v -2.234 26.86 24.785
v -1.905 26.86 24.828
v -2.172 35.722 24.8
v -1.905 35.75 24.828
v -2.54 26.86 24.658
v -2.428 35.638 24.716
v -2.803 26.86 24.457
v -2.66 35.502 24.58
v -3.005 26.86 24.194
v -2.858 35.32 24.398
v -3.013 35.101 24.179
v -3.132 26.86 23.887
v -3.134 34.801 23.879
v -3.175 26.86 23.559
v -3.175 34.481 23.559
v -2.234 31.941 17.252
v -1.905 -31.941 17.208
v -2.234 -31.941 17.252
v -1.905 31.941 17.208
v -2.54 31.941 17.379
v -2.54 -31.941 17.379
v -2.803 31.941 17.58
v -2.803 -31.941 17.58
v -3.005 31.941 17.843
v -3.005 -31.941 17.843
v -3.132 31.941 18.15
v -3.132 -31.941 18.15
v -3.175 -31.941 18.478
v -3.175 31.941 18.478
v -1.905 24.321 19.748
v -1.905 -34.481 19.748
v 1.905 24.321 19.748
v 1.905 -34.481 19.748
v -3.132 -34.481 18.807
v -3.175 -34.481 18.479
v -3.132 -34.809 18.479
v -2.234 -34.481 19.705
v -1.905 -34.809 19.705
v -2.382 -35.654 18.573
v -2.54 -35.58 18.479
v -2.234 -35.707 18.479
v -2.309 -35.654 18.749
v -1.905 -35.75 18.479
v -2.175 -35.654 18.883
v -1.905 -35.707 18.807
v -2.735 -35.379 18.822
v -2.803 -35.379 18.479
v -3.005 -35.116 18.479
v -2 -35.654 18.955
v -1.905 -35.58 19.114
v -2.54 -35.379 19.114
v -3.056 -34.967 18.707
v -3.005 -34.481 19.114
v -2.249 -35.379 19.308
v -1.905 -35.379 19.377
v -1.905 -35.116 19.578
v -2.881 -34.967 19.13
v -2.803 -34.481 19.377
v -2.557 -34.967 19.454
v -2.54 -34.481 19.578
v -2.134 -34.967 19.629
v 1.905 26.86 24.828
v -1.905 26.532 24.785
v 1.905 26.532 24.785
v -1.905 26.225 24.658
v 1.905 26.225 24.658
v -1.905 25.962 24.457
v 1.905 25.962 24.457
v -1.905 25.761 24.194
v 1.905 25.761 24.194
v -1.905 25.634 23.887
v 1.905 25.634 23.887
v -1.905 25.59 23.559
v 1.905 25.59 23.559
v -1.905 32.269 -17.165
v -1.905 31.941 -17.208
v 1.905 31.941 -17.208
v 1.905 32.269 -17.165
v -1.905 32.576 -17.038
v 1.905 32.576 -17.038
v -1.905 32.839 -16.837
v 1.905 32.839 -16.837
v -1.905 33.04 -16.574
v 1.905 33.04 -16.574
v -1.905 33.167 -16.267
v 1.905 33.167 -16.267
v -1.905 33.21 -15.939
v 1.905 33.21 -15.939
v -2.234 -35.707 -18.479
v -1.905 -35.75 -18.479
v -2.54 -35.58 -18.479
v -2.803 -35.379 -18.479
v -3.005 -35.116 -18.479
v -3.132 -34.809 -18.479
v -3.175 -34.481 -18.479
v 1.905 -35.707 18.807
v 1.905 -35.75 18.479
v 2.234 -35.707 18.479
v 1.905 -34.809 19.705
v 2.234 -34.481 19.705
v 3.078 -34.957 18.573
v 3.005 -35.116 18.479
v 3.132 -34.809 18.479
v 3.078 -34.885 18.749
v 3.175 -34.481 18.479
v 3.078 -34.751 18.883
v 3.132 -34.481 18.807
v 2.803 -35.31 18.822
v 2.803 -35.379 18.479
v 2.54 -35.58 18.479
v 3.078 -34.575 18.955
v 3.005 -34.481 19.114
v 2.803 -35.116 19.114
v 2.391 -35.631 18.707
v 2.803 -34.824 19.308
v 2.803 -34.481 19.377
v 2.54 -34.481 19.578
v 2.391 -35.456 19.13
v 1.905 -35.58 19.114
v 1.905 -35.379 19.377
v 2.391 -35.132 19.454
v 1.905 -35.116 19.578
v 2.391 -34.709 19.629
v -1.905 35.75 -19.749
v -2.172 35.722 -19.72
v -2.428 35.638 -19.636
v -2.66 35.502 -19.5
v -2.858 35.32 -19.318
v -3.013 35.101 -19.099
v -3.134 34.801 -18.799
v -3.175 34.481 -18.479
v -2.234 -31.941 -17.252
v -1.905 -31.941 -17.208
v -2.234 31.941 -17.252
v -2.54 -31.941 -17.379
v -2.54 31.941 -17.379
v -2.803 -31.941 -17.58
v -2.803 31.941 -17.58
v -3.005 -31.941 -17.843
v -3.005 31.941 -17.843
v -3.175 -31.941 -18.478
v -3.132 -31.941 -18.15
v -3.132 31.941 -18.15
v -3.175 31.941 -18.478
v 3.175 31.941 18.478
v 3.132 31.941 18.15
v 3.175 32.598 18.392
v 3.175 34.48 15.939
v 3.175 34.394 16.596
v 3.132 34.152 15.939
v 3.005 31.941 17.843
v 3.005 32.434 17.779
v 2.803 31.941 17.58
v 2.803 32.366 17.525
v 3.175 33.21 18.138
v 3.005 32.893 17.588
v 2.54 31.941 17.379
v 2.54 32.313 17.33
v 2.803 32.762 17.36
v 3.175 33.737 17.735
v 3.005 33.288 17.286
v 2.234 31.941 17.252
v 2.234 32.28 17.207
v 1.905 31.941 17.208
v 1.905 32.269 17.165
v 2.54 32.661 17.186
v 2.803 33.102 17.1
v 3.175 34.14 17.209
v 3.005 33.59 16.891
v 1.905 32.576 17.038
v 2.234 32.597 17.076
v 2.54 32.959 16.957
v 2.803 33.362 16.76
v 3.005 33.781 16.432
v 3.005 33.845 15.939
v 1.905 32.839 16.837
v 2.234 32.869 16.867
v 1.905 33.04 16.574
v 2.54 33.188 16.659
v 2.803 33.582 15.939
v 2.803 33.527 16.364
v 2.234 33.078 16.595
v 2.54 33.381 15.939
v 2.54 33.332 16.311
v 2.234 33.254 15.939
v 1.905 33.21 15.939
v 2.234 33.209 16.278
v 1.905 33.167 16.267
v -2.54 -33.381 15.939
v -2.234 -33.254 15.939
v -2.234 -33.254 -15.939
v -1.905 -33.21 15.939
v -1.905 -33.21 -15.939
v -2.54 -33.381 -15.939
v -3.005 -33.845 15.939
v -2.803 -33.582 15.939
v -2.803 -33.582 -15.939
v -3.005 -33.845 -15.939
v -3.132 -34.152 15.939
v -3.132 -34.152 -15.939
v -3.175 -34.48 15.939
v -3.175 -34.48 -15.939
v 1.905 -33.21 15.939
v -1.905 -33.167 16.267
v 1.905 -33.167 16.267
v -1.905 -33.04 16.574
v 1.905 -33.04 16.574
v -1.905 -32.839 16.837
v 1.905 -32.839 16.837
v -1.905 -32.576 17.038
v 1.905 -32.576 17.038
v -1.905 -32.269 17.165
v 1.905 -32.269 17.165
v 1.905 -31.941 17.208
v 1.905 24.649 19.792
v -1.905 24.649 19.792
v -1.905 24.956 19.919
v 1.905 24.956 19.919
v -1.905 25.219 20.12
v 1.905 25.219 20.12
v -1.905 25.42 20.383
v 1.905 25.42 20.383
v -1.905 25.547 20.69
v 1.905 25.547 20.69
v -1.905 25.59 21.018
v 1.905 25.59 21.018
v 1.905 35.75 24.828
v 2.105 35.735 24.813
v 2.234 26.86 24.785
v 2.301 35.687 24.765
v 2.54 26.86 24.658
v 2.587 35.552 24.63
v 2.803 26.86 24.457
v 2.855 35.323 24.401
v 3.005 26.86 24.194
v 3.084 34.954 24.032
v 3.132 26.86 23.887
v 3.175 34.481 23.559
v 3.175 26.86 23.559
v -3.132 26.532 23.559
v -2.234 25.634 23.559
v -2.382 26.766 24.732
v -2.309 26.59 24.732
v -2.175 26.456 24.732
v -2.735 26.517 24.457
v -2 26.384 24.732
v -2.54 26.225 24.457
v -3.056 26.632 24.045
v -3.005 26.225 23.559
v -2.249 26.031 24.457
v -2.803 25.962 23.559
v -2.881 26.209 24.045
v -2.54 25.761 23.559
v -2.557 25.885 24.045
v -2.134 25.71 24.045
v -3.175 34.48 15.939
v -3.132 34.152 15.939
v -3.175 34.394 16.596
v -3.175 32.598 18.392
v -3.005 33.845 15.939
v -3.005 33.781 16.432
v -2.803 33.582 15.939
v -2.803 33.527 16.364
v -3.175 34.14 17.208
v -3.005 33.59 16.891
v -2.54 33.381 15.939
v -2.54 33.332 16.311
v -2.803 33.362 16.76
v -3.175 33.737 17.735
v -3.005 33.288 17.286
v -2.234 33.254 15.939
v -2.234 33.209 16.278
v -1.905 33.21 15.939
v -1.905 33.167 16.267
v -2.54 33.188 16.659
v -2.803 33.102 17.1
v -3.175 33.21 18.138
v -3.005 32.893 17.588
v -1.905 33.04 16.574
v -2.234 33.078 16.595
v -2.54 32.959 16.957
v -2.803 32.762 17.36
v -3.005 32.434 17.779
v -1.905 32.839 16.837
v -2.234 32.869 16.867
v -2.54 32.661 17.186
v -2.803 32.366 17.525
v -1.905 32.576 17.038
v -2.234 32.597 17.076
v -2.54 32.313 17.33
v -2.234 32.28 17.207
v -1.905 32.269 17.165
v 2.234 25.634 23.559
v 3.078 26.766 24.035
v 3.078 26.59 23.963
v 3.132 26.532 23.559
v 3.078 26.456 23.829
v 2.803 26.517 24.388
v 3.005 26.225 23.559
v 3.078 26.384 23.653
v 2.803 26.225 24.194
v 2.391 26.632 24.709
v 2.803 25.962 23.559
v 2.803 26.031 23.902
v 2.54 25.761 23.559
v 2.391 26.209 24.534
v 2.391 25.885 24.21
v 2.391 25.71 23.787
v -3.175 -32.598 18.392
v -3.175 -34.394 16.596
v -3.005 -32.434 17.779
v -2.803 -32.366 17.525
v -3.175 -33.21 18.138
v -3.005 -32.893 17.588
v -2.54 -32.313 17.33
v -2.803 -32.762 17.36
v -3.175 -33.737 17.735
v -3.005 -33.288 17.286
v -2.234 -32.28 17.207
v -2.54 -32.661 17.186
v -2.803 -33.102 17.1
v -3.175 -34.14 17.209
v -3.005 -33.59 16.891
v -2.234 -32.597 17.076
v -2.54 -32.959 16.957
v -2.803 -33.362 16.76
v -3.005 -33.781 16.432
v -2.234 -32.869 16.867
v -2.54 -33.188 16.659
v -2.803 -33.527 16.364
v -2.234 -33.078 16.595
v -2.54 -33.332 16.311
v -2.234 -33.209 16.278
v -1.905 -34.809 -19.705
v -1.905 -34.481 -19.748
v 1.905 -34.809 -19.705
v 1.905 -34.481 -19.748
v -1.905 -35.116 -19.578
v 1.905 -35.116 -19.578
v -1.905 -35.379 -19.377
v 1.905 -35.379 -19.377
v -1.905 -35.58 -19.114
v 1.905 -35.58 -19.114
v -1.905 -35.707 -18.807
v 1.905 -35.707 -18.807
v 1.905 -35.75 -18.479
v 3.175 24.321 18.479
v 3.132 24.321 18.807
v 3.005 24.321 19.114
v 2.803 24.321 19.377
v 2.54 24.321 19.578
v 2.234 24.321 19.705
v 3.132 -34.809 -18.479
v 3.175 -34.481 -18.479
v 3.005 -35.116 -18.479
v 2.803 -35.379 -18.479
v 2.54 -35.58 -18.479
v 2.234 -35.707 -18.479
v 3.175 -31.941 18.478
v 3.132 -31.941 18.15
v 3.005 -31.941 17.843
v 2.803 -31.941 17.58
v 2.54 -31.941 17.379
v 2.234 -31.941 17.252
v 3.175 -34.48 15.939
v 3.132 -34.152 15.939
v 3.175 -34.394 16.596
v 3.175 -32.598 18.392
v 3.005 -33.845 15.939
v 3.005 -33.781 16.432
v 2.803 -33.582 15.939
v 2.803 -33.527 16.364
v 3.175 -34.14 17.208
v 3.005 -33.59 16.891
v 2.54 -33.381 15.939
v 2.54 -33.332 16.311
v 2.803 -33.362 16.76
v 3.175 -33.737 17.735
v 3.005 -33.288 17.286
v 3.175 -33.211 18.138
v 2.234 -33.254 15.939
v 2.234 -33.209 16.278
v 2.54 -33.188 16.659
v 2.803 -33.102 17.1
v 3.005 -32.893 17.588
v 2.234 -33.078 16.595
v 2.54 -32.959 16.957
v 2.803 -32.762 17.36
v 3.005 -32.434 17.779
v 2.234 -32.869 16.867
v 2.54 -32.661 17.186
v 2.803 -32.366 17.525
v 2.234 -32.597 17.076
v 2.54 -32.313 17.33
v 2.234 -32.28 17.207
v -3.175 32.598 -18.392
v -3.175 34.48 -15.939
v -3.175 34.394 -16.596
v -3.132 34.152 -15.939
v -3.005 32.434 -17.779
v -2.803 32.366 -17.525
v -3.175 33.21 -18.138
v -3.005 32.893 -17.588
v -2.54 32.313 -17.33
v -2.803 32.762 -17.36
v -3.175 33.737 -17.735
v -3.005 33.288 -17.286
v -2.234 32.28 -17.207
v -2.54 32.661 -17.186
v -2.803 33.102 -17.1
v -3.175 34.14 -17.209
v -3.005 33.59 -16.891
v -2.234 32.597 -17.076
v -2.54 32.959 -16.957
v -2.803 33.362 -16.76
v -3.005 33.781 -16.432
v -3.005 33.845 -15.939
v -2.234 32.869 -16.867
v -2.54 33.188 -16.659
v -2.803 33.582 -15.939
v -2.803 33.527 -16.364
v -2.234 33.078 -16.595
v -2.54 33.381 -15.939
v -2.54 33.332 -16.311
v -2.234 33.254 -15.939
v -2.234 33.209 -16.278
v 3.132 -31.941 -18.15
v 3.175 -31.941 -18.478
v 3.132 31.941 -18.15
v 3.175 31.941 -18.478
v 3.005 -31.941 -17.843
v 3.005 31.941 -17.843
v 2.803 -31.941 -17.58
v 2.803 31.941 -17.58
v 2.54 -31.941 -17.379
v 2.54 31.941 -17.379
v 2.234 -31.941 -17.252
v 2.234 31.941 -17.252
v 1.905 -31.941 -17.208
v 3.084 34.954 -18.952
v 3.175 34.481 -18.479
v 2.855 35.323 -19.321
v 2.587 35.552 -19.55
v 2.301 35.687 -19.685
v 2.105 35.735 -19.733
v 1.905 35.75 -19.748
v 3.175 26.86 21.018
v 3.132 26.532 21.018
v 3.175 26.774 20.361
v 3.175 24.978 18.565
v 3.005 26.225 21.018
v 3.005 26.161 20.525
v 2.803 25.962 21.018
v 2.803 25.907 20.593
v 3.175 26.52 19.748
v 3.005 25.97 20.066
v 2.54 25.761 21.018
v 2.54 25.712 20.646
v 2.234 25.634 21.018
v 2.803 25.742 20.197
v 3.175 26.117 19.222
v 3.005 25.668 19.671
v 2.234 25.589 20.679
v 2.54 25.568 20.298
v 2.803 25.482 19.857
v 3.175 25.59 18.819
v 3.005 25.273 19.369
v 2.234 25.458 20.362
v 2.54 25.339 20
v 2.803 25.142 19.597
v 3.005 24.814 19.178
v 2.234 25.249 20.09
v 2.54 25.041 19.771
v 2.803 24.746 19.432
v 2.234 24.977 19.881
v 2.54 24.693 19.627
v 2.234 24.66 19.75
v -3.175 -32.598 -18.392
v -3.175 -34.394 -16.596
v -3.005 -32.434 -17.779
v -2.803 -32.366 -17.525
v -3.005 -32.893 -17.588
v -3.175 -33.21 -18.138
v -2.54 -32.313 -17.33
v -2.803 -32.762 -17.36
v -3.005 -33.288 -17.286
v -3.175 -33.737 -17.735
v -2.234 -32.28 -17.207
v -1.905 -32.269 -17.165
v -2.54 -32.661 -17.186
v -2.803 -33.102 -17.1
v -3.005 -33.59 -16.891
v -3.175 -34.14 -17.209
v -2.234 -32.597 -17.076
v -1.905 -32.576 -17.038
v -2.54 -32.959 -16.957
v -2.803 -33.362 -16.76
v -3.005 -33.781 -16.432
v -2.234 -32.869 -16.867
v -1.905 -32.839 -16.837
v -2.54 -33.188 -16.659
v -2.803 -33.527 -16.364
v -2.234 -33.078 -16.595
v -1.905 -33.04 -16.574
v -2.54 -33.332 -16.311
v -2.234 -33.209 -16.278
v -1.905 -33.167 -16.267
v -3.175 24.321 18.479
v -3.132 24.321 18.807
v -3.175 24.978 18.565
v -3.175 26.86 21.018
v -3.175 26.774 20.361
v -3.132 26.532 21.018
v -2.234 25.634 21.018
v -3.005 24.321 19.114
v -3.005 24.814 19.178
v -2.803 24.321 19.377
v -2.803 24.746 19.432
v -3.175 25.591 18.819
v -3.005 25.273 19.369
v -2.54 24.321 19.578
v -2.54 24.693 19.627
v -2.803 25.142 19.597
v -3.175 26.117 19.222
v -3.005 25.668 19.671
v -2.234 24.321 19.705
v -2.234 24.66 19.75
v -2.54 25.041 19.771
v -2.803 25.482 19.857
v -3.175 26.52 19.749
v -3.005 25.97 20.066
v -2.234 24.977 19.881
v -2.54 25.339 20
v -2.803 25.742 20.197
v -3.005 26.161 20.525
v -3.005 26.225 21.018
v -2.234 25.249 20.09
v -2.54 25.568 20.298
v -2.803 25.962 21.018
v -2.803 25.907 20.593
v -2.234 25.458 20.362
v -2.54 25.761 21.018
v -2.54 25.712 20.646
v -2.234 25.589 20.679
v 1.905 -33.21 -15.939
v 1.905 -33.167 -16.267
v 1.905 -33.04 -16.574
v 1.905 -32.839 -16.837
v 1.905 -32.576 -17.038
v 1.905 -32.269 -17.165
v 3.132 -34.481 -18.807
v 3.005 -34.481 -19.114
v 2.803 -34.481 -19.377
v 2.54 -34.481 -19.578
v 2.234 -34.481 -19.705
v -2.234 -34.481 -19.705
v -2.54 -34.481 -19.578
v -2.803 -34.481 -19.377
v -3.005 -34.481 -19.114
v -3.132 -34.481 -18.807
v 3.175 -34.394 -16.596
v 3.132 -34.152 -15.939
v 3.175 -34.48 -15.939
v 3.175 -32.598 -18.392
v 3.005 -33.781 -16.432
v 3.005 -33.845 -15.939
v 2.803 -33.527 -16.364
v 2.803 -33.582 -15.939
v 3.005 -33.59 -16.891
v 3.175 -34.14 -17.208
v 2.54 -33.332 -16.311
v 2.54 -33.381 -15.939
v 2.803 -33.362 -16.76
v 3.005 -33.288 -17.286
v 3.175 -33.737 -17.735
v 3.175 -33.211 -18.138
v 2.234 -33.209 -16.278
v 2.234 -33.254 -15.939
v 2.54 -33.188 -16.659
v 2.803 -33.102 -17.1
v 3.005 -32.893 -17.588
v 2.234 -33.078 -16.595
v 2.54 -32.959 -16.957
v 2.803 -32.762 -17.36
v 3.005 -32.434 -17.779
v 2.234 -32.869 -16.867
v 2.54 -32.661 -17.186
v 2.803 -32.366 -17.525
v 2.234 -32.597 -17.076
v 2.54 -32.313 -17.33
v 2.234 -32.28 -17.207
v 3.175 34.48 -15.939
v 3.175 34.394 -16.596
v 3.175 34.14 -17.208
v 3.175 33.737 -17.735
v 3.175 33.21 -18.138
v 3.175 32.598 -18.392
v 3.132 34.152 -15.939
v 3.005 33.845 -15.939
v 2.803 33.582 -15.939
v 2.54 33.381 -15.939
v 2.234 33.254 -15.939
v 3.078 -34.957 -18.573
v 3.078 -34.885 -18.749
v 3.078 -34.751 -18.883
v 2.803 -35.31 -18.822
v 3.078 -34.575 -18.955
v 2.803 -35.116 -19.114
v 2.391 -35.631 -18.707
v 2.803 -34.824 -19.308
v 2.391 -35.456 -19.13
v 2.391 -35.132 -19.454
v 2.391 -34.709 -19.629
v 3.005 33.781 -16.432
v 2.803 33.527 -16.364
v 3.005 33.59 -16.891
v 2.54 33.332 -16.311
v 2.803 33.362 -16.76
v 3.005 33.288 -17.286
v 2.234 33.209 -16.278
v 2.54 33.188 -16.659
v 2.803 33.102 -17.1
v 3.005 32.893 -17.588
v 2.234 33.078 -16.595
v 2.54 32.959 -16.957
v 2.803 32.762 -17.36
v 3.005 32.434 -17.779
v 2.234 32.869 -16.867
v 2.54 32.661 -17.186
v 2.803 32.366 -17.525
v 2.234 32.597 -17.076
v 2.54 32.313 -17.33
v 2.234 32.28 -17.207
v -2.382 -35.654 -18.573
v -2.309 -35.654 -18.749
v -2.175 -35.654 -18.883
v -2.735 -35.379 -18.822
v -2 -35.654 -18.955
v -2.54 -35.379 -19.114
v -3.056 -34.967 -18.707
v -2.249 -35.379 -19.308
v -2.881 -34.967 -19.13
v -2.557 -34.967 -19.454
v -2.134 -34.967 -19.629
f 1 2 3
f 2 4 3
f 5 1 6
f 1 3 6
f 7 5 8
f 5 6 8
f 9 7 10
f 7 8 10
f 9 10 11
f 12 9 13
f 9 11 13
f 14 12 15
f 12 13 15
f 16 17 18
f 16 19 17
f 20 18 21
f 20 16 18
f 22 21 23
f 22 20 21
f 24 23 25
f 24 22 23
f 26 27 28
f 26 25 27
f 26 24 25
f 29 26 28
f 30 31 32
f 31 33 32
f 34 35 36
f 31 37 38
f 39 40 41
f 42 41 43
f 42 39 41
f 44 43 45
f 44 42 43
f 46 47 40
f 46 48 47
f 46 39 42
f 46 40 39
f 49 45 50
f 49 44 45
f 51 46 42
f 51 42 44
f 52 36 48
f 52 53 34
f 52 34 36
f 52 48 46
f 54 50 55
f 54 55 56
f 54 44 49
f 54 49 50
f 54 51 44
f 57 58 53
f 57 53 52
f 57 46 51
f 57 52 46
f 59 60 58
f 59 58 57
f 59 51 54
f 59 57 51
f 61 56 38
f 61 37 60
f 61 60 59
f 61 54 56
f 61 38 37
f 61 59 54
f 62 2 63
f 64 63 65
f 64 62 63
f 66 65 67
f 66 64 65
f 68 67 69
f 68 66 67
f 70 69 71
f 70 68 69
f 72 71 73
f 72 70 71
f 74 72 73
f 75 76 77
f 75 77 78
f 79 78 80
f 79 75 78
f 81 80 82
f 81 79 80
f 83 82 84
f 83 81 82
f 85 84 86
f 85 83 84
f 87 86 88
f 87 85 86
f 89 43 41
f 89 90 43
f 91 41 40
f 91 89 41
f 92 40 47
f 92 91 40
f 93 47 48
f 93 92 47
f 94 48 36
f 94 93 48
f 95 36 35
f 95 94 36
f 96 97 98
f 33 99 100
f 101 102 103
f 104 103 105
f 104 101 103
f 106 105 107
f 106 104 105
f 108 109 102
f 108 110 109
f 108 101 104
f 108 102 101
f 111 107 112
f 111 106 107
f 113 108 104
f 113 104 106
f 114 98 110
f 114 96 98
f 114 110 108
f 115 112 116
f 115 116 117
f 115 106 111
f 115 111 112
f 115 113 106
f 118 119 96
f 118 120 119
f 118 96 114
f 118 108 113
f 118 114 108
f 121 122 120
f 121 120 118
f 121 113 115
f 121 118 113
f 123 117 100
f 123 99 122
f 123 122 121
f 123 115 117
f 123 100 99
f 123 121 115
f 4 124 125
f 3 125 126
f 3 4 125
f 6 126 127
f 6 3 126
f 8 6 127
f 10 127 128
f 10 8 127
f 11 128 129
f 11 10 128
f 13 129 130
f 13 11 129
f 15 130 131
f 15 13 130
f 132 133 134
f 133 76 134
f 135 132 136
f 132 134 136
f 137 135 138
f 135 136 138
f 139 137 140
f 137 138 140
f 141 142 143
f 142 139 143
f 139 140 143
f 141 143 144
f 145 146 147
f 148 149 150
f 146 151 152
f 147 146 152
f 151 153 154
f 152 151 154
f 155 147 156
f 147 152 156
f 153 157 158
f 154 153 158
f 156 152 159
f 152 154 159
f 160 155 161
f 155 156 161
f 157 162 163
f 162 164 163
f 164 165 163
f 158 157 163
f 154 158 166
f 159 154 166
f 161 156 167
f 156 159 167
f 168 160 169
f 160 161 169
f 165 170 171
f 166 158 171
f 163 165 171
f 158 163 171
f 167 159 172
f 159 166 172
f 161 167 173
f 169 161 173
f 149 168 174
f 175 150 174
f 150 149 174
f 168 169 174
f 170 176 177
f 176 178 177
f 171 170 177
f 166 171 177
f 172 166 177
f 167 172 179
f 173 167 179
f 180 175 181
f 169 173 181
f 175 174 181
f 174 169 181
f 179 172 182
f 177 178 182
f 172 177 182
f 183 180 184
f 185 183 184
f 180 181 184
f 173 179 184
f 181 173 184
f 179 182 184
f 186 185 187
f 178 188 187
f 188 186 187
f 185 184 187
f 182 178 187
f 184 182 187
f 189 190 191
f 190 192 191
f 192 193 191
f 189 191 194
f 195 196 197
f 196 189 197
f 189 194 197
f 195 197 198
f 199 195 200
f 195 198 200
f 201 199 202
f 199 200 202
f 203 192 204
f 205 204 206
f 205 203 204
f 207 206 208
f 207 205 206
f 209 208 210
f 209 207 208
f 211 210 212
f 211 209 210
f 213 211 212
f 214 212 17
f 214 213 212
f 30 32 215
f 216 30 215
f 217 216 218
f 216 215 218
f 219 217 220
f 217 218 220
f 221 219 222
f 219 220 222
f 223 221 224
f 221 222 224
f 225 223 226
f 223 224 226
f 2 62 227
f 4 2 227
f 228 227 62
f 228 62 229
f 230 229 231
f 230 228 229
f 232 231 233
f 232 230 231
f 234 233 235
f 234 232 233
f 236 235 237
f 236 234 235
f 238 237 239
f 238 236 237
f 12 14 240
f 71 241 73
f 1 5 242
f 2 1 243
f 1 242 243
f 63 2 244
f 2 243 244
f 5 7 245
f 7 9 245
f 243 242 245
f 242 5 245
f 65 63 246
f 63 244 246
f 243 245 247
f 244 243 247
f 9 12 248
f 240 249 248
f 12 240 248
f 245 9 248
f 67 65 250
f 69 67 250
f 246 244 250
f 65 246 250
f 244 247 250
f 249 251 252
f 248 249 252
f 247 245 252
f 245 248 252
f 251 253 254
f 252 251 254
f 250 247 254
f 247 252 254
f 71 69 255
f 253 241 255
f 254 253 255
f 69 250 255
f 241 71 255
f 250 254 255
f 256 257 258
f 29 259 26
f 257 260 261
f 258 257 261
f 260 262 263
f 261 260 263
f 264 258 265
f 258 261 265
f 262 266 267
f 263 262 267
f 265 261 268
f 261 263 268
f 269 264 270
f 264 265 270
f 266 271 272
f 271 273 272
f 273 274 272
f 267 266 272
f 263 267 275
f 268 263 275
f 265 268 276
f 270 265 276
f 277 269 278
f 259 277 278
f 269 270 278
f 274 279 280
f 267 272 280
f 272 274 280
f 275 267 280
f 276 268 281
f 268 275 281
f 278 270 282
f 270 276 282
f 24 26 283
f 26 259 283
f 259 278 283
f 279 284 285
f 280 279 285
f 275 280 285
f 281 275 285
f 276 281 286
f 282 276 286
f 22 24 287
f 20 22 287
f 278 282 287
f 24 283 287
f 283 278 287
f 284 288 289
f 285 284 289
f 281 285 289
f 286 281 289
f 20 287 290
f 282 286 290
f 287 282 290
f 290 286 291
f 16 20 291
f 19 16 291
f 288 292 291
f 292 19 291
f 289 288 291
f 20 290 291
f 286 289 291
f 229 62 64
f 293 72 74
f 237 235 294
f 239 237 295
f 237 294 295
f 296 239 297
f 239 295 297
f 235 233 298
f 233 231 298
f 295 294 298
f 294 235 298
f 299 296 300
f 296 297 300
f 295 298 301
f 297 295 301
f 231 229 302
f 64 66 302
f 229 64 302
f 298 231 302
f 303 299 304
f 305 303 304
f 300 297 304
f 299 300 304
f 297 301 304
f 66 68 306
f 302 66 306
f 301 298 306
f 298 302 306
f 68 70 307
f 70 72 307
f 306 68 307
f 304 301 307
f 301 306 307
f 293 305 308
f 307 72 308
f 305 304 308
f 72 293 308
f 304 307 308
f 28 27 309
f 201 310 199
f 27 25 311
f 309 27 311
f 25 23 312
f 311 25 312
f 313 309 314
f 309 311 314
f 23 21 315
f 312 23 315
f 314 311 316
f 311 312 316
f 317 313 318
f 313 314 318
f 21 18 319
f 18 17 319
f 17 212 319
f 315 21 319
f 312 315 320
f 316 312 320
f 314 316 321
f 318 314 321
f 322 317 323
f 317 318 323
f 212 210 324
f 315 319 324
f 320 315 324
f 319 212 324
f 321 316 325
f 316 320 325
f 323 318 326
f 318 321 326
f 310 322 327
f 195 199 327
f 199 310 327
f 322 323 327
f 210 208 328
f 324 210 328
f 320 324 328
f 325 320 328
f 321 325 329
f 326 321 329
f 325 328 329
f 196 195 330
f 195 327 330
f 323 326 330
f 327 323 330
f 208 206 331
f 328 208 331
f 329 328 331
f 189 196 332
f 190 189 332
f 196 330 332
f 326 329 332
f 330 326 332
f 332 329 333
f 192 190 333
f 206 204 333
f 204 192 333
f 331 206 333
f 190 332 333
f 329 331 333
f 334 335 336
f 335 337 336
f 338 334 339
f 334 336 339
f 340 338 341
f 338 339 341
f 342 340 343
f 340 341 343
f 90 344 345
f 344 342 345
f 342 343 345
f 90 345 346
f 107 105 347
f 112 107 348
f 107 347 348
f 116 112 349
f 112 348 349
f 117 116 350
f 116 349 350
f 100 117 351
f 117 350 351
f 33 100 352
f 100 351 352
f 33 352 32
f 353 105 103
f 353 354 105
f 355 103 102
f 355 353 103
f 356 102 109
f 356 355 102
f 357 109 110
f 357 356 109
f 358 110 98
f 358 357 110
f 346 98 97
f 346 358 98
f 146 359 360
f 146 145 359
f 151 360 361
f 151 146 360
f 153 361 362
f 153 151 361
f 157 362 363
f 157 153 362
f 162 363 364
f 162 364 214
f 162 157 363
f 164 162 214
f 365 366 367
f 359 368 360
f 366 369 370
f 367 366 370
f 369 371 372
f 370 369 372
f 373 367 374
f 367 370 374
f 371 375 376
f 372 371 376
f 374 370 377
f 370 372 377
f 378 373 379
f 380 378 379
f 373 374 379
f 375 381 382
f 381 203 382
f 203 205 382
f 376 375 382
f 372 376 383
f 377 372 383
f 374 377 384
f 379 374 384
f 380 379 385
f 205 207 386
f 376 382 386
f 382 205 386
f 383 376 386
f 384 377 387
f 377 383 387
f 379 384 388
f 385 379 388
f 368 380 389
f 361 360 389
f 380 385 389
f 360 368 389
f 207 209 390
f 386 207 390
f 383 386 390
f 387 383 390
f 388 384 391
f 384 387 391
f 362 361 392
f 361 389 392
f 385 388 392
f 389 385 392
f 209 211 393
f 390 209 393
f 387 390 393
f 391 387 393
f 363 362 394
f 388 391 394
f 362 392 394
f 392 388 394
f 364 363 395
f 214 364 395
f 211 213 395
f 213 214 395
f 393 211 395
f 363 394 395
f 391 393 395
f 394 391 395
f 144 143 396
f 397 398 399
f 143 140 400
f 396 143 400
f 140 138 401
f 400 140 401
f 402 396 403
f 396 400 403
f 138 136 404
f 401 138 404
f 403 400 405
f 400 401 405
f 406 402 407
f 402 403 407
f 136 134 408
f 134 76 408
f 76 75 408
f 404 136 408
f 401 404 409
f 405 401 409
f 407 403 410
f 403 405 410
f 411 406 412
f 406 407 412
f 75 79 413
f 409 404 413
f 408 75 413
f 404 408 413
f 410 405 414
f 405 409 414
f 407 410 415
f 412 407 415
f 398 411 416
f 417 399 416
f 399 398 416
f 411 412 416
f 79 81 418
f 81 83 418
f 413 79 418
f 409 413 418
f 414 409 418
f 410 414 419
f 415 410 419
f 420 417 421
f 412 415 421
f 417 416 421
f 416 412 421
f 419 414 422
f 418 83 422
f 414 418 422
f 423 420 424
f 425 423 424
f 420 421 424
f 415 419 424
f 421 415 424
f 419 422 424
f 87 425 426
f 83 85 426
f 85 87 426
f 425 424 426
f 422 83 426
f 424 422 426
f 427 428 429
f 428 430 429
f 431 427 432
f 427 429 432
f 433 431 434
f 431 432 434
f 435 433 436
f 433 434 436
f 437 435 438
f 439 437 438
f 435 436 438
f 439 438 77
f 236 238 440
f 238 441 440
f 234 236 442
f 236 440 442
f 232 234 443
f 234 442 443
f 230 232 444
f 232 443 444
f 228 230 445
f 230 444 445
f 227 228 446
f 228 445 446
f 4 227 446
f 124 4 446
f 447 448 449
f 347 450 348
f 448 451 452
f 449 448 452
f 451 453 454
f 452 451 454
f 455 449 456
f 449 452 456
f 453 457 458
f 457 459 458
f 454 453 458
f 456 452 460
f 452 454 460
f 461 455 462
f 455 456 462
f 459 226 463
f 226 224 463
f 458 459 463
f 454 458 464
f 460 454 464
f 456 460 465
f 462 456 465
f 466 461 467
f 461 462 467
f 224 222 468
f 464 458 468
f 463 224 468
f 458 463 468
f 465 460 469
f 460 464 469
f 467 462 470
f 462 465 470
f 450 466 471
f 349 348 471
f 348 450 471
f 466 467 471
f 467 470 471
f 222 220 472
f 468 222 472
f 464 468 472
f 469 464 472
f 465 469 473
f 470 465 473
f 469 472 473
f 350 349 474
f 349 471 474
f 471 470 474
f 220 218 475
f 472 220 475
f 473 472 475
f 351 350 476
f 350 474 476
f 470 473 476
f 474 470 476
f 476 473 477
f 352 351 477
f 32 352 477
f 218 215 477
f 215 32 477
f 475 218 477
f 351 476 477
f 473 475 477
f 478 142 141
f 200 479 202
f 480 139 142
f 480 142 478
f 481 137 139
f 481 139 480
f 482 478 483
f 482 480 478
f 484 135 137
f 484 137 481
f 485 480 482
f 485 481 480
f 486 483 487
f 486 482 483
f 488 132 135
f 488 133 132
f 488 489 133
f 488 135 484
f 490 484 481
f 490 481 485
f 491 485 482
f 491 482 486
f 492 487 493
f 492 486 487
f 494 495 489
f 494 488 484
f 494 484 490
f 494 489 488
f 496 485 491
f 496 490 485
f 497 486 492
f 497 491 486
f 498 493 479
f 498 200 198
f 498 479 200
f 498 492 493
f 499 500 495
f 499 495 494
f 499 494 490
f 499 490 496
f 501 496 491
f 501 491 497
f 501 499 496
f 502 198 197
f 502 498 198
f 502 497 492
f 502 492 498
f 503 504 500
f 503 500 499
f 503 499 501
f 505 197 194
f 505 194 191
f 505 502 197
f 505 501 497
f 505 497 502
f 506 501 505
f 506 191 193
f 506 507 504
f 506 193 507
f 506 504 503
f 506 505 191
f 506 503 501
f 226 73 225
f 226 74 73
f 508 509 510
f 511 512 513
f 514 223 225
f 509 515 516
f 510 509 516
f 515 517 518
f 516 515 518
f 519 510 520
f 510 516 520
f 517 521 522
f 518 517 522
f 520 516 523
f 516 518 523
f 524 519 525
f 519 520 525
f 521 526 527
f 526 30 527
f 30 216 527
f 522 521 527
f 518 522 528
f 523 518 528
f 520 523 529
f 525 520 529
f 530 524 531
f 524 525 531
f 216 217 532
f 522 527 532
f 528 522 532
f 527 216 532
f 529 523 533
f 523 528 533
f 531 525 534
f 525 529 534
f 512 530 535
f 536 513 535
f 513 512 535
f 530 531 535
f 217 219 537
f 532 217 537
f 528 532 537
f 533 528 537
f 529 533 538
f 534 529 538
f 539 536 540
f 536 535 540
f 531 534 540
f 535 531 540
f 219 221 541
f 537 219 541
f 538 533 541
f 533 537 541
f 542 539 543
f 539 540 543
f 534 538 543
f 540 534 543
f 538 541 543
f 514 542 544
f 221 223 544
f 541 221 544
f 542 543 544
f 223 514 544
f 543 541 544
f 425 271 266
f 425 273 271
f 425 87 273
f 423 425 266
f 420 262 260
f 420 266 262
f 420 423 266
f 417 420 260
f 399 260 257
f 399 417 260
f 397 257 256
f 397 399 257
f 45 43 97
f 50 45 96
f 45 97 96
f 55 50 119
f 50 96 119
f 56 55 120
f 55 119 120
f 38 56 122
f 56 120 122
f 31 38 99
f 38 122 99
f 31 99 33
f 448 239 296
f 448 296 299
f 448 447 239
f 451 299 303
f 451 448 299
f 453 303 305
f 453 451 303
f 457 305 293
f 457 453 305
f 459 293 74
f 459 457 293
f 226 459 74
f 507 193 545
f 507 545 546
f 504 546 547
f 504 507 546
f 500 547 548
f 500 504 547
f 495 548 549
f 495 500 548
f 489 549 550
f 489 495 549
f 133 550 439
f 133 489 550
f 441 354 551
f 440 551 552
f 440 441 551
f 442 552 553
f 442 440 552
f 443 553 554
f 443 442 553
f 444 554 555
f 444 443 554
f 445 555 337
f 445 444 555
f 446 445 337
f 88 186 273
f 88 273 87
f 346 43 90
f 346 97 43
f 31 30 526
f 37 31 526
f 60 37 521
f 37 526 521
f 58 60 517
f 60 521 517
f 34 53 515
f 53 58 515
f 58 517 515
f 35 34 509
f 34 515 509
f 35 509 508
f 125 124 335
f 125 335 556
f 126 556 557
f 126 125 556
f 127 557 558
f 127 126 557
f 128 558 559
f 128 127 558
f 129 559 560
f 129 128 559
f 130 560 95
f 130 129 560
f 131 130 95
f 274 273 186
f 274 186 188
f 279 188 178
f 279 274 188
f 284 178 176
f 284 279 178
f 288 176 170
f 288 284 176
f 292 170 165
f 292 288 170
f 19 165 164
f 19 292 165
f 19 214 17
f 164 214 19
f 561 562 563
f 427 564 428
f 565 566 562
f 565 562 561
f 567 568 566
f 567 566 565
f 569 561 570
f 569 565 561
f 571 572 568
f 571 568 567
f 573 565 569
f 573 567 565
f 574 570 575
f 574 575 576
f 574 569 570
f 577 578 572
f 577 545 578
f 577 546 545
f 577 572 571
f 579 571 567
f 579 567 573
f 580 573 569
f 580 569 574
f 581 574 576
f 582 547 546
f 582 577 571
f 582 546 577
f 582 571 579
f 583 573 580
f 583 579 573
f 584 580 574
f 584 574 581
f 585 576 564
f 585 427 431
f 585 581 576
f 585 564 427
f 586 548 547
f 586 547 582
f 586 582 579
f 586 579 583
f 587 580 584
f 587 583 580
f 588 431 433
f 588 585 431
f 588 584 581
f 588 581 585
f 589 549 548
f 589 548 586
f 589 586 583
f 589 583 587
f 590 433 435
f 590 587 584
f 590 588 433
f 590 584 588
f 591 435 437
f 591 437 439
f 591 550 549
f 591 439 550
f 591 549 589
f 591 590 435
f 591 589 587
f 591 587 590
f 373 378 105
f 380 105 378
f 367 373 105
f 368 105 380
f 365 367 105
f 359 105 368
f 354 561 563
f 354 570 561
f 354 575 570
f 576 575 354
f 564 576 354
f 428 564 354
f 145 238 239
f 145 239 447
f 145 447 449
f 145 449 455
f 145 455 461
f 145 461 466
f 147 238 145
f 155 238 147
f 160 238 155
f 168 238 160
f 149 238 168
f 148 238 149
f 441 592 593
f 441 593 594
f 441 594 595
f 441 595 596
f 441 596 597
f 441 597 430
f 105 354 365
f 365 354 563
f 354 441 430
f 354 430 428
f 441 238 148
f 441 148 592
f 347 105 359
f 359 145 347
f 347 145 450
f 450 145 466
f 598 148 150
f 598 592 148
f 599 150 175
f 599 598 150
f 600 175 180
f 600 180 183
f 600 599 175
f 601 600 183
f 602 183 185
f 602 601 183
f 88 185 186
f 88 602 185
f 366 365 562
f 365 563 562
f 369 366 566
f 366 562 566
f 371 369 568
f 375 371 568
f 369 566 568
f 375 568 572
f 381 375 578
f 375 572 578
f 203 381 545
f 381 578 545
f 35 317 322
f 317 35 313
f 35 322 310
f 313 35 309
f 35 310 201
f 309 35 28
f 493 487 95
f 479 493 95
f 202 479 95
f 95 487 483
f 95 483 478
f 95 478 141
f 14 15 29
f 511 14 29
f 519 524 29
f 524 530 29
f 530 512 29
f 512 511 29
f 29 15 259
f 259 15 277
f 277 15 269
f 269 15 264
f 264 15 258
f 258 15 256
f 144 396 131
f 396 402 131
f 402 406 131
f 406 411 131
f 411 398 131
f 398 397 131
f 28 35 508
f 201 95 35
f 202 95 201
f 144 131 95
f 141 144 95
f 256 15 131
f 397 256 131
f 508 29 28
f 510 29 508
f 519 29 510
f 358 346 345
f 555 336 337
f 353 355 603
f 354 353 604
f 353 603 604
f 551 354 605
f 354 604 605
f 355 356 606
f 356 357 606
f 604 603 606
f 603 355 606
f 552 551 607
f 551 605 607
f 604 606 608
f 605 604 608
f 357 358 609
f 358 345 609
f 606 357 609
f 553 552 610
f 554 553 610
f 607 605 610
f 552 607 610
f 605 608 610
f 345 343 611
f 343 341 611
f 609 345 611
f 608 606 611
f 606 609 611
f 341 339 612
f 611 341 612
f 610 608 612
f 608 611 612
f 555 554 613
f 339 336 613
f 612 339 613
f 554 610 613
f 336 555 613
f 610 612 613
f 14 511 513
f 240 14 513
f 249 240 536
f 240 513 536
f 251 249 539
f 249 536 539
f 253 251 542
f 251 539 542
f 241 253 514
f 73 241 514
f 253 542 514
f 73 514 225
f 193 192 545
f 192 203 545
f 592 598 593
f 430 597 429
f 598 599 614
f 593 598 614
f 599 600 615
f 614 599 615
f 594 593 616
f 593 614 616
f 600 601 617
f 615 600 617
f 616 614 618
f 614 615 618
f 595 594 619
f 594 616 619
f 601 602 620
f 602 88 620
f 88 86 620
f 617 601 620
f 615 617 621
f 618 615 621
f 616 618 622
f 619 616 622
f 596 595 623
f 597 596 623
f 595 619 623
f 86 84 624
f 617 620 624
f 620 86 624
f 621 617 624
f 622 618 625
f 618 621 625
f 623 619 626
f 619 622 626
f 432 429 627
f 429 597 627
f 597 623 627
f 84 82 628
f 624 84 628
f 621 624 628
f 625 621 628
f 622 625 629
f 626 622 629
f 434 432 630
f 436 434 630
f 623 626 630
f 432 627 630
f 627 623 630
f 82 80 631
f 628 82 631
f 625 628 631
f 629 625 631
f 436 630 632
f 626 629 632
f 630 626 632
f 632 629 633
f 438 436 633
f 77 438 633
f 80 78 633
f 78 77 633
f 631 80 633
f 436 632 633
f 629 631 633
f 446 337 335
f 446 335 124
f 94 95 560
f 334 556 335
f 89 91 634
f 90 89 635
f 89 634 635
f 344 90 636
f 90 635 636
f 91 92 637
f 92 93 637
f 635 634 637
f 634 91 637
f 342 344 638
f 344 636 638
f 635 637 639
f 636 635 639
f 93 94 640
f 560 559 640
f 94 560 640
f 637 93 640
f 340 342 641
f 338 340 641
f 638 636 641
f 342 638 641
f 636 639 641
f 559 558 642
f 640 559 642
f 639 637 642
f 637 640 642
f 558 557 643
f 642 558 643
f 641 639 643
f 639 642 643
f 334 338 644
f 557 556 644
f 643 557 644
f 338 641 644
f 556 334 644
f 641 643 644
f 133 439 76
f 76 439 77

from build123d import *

# Parameters (mm, degrees)
SKETCH1_W           = 39.497
SKETCH1_H           = 71.501
SKETCH1_W_2         = 34.417
SKETCH1_H_2         = 66.421
SKETCH1_W_3         = 5.08
SKETCH1_H_3         = 10.16
BOSS_EXTRUDE1_DEPTH = 3.175
FILLET1_R           = 1.27


with BuildPart() as part:
    # Sketch1 → Boss-Extrude1 (new, symmetric)
    # profile 1 of 2: a face of its own
    with BuildSketch(Plane(origin=(0, 0, 0), x_dir=(0, 0, -1), z_dir=(1, 0, 0))):
        Rectangle(SKETCH1_W, SKETCH1_H)
        Rectangle(SKETCH1_W_2, SKETCH1_H_2, mode=Mode.SUBTRACT)
    # profile 2 of 2: a face of its own
    with BuildSketch(Plane(origin=(0, 0, 0), x_dir=(0, 0, -1), z_dir=(1, 0, 0))):
        with Locations((-22.2885, 30.6705)):
            Rectangle(SKETCH1_W_3, SKETCH1_H_3)
    extrude(amount=BOSS_EXTRUDE1_DEPTH, both=True)

    # Fillet1
    fillet1_edges = [part.edges().sort_by_distance(p)[0] for p in [
        (-3.175, -5.08, 19.7485),
        (-3.175, 25.5905, 22.2885),
        (-3.175, 30.6705, 24.8285),
        (-3.175, 35.7505, 2.54),
        (3.175, 33.2105, 0),
        (-3.175, 0, -19.7485),
        (-3.175, -35.7505, 0),
        (-3.175, 0, -17.2085),
        (-3.175, 33.2105, 0),
        (-3.175, 0, 17.2085),
        (-3.175, -33.2105, 0),
        (3.175, 0, -17.2085),
        (0, -35.7505, 19.7485),
        (0, 25.5905, 19.7485),
        (0, 25.5905, 24.8285),
        (0, -35.7505, -19.7485),
        (0, -33.2105, -17.2085),
        (0, 33.2105, -17.2085),
        (0, 33.2105, 17.2085),
        (0, -33.2105, 17.2085),
        (3.175, -35.7505, 0),
        (3.175, 0, -19.7485),
        (3.175, 35.7505, 2.54),
        (3.175, 30.6705, 24.8285),
        (3.175, 25.5905, 22.2885),
        (3.175, -5.08, 19.7485),
        (3.175, -33.2105, 0),
        (3.175, 0, 17.2085),
    ]]
    fillet(fillet1_edges, radius=FILLET1_R - 0.0001)  # a hair under: the kernel refuses the full size


solid = part.part
